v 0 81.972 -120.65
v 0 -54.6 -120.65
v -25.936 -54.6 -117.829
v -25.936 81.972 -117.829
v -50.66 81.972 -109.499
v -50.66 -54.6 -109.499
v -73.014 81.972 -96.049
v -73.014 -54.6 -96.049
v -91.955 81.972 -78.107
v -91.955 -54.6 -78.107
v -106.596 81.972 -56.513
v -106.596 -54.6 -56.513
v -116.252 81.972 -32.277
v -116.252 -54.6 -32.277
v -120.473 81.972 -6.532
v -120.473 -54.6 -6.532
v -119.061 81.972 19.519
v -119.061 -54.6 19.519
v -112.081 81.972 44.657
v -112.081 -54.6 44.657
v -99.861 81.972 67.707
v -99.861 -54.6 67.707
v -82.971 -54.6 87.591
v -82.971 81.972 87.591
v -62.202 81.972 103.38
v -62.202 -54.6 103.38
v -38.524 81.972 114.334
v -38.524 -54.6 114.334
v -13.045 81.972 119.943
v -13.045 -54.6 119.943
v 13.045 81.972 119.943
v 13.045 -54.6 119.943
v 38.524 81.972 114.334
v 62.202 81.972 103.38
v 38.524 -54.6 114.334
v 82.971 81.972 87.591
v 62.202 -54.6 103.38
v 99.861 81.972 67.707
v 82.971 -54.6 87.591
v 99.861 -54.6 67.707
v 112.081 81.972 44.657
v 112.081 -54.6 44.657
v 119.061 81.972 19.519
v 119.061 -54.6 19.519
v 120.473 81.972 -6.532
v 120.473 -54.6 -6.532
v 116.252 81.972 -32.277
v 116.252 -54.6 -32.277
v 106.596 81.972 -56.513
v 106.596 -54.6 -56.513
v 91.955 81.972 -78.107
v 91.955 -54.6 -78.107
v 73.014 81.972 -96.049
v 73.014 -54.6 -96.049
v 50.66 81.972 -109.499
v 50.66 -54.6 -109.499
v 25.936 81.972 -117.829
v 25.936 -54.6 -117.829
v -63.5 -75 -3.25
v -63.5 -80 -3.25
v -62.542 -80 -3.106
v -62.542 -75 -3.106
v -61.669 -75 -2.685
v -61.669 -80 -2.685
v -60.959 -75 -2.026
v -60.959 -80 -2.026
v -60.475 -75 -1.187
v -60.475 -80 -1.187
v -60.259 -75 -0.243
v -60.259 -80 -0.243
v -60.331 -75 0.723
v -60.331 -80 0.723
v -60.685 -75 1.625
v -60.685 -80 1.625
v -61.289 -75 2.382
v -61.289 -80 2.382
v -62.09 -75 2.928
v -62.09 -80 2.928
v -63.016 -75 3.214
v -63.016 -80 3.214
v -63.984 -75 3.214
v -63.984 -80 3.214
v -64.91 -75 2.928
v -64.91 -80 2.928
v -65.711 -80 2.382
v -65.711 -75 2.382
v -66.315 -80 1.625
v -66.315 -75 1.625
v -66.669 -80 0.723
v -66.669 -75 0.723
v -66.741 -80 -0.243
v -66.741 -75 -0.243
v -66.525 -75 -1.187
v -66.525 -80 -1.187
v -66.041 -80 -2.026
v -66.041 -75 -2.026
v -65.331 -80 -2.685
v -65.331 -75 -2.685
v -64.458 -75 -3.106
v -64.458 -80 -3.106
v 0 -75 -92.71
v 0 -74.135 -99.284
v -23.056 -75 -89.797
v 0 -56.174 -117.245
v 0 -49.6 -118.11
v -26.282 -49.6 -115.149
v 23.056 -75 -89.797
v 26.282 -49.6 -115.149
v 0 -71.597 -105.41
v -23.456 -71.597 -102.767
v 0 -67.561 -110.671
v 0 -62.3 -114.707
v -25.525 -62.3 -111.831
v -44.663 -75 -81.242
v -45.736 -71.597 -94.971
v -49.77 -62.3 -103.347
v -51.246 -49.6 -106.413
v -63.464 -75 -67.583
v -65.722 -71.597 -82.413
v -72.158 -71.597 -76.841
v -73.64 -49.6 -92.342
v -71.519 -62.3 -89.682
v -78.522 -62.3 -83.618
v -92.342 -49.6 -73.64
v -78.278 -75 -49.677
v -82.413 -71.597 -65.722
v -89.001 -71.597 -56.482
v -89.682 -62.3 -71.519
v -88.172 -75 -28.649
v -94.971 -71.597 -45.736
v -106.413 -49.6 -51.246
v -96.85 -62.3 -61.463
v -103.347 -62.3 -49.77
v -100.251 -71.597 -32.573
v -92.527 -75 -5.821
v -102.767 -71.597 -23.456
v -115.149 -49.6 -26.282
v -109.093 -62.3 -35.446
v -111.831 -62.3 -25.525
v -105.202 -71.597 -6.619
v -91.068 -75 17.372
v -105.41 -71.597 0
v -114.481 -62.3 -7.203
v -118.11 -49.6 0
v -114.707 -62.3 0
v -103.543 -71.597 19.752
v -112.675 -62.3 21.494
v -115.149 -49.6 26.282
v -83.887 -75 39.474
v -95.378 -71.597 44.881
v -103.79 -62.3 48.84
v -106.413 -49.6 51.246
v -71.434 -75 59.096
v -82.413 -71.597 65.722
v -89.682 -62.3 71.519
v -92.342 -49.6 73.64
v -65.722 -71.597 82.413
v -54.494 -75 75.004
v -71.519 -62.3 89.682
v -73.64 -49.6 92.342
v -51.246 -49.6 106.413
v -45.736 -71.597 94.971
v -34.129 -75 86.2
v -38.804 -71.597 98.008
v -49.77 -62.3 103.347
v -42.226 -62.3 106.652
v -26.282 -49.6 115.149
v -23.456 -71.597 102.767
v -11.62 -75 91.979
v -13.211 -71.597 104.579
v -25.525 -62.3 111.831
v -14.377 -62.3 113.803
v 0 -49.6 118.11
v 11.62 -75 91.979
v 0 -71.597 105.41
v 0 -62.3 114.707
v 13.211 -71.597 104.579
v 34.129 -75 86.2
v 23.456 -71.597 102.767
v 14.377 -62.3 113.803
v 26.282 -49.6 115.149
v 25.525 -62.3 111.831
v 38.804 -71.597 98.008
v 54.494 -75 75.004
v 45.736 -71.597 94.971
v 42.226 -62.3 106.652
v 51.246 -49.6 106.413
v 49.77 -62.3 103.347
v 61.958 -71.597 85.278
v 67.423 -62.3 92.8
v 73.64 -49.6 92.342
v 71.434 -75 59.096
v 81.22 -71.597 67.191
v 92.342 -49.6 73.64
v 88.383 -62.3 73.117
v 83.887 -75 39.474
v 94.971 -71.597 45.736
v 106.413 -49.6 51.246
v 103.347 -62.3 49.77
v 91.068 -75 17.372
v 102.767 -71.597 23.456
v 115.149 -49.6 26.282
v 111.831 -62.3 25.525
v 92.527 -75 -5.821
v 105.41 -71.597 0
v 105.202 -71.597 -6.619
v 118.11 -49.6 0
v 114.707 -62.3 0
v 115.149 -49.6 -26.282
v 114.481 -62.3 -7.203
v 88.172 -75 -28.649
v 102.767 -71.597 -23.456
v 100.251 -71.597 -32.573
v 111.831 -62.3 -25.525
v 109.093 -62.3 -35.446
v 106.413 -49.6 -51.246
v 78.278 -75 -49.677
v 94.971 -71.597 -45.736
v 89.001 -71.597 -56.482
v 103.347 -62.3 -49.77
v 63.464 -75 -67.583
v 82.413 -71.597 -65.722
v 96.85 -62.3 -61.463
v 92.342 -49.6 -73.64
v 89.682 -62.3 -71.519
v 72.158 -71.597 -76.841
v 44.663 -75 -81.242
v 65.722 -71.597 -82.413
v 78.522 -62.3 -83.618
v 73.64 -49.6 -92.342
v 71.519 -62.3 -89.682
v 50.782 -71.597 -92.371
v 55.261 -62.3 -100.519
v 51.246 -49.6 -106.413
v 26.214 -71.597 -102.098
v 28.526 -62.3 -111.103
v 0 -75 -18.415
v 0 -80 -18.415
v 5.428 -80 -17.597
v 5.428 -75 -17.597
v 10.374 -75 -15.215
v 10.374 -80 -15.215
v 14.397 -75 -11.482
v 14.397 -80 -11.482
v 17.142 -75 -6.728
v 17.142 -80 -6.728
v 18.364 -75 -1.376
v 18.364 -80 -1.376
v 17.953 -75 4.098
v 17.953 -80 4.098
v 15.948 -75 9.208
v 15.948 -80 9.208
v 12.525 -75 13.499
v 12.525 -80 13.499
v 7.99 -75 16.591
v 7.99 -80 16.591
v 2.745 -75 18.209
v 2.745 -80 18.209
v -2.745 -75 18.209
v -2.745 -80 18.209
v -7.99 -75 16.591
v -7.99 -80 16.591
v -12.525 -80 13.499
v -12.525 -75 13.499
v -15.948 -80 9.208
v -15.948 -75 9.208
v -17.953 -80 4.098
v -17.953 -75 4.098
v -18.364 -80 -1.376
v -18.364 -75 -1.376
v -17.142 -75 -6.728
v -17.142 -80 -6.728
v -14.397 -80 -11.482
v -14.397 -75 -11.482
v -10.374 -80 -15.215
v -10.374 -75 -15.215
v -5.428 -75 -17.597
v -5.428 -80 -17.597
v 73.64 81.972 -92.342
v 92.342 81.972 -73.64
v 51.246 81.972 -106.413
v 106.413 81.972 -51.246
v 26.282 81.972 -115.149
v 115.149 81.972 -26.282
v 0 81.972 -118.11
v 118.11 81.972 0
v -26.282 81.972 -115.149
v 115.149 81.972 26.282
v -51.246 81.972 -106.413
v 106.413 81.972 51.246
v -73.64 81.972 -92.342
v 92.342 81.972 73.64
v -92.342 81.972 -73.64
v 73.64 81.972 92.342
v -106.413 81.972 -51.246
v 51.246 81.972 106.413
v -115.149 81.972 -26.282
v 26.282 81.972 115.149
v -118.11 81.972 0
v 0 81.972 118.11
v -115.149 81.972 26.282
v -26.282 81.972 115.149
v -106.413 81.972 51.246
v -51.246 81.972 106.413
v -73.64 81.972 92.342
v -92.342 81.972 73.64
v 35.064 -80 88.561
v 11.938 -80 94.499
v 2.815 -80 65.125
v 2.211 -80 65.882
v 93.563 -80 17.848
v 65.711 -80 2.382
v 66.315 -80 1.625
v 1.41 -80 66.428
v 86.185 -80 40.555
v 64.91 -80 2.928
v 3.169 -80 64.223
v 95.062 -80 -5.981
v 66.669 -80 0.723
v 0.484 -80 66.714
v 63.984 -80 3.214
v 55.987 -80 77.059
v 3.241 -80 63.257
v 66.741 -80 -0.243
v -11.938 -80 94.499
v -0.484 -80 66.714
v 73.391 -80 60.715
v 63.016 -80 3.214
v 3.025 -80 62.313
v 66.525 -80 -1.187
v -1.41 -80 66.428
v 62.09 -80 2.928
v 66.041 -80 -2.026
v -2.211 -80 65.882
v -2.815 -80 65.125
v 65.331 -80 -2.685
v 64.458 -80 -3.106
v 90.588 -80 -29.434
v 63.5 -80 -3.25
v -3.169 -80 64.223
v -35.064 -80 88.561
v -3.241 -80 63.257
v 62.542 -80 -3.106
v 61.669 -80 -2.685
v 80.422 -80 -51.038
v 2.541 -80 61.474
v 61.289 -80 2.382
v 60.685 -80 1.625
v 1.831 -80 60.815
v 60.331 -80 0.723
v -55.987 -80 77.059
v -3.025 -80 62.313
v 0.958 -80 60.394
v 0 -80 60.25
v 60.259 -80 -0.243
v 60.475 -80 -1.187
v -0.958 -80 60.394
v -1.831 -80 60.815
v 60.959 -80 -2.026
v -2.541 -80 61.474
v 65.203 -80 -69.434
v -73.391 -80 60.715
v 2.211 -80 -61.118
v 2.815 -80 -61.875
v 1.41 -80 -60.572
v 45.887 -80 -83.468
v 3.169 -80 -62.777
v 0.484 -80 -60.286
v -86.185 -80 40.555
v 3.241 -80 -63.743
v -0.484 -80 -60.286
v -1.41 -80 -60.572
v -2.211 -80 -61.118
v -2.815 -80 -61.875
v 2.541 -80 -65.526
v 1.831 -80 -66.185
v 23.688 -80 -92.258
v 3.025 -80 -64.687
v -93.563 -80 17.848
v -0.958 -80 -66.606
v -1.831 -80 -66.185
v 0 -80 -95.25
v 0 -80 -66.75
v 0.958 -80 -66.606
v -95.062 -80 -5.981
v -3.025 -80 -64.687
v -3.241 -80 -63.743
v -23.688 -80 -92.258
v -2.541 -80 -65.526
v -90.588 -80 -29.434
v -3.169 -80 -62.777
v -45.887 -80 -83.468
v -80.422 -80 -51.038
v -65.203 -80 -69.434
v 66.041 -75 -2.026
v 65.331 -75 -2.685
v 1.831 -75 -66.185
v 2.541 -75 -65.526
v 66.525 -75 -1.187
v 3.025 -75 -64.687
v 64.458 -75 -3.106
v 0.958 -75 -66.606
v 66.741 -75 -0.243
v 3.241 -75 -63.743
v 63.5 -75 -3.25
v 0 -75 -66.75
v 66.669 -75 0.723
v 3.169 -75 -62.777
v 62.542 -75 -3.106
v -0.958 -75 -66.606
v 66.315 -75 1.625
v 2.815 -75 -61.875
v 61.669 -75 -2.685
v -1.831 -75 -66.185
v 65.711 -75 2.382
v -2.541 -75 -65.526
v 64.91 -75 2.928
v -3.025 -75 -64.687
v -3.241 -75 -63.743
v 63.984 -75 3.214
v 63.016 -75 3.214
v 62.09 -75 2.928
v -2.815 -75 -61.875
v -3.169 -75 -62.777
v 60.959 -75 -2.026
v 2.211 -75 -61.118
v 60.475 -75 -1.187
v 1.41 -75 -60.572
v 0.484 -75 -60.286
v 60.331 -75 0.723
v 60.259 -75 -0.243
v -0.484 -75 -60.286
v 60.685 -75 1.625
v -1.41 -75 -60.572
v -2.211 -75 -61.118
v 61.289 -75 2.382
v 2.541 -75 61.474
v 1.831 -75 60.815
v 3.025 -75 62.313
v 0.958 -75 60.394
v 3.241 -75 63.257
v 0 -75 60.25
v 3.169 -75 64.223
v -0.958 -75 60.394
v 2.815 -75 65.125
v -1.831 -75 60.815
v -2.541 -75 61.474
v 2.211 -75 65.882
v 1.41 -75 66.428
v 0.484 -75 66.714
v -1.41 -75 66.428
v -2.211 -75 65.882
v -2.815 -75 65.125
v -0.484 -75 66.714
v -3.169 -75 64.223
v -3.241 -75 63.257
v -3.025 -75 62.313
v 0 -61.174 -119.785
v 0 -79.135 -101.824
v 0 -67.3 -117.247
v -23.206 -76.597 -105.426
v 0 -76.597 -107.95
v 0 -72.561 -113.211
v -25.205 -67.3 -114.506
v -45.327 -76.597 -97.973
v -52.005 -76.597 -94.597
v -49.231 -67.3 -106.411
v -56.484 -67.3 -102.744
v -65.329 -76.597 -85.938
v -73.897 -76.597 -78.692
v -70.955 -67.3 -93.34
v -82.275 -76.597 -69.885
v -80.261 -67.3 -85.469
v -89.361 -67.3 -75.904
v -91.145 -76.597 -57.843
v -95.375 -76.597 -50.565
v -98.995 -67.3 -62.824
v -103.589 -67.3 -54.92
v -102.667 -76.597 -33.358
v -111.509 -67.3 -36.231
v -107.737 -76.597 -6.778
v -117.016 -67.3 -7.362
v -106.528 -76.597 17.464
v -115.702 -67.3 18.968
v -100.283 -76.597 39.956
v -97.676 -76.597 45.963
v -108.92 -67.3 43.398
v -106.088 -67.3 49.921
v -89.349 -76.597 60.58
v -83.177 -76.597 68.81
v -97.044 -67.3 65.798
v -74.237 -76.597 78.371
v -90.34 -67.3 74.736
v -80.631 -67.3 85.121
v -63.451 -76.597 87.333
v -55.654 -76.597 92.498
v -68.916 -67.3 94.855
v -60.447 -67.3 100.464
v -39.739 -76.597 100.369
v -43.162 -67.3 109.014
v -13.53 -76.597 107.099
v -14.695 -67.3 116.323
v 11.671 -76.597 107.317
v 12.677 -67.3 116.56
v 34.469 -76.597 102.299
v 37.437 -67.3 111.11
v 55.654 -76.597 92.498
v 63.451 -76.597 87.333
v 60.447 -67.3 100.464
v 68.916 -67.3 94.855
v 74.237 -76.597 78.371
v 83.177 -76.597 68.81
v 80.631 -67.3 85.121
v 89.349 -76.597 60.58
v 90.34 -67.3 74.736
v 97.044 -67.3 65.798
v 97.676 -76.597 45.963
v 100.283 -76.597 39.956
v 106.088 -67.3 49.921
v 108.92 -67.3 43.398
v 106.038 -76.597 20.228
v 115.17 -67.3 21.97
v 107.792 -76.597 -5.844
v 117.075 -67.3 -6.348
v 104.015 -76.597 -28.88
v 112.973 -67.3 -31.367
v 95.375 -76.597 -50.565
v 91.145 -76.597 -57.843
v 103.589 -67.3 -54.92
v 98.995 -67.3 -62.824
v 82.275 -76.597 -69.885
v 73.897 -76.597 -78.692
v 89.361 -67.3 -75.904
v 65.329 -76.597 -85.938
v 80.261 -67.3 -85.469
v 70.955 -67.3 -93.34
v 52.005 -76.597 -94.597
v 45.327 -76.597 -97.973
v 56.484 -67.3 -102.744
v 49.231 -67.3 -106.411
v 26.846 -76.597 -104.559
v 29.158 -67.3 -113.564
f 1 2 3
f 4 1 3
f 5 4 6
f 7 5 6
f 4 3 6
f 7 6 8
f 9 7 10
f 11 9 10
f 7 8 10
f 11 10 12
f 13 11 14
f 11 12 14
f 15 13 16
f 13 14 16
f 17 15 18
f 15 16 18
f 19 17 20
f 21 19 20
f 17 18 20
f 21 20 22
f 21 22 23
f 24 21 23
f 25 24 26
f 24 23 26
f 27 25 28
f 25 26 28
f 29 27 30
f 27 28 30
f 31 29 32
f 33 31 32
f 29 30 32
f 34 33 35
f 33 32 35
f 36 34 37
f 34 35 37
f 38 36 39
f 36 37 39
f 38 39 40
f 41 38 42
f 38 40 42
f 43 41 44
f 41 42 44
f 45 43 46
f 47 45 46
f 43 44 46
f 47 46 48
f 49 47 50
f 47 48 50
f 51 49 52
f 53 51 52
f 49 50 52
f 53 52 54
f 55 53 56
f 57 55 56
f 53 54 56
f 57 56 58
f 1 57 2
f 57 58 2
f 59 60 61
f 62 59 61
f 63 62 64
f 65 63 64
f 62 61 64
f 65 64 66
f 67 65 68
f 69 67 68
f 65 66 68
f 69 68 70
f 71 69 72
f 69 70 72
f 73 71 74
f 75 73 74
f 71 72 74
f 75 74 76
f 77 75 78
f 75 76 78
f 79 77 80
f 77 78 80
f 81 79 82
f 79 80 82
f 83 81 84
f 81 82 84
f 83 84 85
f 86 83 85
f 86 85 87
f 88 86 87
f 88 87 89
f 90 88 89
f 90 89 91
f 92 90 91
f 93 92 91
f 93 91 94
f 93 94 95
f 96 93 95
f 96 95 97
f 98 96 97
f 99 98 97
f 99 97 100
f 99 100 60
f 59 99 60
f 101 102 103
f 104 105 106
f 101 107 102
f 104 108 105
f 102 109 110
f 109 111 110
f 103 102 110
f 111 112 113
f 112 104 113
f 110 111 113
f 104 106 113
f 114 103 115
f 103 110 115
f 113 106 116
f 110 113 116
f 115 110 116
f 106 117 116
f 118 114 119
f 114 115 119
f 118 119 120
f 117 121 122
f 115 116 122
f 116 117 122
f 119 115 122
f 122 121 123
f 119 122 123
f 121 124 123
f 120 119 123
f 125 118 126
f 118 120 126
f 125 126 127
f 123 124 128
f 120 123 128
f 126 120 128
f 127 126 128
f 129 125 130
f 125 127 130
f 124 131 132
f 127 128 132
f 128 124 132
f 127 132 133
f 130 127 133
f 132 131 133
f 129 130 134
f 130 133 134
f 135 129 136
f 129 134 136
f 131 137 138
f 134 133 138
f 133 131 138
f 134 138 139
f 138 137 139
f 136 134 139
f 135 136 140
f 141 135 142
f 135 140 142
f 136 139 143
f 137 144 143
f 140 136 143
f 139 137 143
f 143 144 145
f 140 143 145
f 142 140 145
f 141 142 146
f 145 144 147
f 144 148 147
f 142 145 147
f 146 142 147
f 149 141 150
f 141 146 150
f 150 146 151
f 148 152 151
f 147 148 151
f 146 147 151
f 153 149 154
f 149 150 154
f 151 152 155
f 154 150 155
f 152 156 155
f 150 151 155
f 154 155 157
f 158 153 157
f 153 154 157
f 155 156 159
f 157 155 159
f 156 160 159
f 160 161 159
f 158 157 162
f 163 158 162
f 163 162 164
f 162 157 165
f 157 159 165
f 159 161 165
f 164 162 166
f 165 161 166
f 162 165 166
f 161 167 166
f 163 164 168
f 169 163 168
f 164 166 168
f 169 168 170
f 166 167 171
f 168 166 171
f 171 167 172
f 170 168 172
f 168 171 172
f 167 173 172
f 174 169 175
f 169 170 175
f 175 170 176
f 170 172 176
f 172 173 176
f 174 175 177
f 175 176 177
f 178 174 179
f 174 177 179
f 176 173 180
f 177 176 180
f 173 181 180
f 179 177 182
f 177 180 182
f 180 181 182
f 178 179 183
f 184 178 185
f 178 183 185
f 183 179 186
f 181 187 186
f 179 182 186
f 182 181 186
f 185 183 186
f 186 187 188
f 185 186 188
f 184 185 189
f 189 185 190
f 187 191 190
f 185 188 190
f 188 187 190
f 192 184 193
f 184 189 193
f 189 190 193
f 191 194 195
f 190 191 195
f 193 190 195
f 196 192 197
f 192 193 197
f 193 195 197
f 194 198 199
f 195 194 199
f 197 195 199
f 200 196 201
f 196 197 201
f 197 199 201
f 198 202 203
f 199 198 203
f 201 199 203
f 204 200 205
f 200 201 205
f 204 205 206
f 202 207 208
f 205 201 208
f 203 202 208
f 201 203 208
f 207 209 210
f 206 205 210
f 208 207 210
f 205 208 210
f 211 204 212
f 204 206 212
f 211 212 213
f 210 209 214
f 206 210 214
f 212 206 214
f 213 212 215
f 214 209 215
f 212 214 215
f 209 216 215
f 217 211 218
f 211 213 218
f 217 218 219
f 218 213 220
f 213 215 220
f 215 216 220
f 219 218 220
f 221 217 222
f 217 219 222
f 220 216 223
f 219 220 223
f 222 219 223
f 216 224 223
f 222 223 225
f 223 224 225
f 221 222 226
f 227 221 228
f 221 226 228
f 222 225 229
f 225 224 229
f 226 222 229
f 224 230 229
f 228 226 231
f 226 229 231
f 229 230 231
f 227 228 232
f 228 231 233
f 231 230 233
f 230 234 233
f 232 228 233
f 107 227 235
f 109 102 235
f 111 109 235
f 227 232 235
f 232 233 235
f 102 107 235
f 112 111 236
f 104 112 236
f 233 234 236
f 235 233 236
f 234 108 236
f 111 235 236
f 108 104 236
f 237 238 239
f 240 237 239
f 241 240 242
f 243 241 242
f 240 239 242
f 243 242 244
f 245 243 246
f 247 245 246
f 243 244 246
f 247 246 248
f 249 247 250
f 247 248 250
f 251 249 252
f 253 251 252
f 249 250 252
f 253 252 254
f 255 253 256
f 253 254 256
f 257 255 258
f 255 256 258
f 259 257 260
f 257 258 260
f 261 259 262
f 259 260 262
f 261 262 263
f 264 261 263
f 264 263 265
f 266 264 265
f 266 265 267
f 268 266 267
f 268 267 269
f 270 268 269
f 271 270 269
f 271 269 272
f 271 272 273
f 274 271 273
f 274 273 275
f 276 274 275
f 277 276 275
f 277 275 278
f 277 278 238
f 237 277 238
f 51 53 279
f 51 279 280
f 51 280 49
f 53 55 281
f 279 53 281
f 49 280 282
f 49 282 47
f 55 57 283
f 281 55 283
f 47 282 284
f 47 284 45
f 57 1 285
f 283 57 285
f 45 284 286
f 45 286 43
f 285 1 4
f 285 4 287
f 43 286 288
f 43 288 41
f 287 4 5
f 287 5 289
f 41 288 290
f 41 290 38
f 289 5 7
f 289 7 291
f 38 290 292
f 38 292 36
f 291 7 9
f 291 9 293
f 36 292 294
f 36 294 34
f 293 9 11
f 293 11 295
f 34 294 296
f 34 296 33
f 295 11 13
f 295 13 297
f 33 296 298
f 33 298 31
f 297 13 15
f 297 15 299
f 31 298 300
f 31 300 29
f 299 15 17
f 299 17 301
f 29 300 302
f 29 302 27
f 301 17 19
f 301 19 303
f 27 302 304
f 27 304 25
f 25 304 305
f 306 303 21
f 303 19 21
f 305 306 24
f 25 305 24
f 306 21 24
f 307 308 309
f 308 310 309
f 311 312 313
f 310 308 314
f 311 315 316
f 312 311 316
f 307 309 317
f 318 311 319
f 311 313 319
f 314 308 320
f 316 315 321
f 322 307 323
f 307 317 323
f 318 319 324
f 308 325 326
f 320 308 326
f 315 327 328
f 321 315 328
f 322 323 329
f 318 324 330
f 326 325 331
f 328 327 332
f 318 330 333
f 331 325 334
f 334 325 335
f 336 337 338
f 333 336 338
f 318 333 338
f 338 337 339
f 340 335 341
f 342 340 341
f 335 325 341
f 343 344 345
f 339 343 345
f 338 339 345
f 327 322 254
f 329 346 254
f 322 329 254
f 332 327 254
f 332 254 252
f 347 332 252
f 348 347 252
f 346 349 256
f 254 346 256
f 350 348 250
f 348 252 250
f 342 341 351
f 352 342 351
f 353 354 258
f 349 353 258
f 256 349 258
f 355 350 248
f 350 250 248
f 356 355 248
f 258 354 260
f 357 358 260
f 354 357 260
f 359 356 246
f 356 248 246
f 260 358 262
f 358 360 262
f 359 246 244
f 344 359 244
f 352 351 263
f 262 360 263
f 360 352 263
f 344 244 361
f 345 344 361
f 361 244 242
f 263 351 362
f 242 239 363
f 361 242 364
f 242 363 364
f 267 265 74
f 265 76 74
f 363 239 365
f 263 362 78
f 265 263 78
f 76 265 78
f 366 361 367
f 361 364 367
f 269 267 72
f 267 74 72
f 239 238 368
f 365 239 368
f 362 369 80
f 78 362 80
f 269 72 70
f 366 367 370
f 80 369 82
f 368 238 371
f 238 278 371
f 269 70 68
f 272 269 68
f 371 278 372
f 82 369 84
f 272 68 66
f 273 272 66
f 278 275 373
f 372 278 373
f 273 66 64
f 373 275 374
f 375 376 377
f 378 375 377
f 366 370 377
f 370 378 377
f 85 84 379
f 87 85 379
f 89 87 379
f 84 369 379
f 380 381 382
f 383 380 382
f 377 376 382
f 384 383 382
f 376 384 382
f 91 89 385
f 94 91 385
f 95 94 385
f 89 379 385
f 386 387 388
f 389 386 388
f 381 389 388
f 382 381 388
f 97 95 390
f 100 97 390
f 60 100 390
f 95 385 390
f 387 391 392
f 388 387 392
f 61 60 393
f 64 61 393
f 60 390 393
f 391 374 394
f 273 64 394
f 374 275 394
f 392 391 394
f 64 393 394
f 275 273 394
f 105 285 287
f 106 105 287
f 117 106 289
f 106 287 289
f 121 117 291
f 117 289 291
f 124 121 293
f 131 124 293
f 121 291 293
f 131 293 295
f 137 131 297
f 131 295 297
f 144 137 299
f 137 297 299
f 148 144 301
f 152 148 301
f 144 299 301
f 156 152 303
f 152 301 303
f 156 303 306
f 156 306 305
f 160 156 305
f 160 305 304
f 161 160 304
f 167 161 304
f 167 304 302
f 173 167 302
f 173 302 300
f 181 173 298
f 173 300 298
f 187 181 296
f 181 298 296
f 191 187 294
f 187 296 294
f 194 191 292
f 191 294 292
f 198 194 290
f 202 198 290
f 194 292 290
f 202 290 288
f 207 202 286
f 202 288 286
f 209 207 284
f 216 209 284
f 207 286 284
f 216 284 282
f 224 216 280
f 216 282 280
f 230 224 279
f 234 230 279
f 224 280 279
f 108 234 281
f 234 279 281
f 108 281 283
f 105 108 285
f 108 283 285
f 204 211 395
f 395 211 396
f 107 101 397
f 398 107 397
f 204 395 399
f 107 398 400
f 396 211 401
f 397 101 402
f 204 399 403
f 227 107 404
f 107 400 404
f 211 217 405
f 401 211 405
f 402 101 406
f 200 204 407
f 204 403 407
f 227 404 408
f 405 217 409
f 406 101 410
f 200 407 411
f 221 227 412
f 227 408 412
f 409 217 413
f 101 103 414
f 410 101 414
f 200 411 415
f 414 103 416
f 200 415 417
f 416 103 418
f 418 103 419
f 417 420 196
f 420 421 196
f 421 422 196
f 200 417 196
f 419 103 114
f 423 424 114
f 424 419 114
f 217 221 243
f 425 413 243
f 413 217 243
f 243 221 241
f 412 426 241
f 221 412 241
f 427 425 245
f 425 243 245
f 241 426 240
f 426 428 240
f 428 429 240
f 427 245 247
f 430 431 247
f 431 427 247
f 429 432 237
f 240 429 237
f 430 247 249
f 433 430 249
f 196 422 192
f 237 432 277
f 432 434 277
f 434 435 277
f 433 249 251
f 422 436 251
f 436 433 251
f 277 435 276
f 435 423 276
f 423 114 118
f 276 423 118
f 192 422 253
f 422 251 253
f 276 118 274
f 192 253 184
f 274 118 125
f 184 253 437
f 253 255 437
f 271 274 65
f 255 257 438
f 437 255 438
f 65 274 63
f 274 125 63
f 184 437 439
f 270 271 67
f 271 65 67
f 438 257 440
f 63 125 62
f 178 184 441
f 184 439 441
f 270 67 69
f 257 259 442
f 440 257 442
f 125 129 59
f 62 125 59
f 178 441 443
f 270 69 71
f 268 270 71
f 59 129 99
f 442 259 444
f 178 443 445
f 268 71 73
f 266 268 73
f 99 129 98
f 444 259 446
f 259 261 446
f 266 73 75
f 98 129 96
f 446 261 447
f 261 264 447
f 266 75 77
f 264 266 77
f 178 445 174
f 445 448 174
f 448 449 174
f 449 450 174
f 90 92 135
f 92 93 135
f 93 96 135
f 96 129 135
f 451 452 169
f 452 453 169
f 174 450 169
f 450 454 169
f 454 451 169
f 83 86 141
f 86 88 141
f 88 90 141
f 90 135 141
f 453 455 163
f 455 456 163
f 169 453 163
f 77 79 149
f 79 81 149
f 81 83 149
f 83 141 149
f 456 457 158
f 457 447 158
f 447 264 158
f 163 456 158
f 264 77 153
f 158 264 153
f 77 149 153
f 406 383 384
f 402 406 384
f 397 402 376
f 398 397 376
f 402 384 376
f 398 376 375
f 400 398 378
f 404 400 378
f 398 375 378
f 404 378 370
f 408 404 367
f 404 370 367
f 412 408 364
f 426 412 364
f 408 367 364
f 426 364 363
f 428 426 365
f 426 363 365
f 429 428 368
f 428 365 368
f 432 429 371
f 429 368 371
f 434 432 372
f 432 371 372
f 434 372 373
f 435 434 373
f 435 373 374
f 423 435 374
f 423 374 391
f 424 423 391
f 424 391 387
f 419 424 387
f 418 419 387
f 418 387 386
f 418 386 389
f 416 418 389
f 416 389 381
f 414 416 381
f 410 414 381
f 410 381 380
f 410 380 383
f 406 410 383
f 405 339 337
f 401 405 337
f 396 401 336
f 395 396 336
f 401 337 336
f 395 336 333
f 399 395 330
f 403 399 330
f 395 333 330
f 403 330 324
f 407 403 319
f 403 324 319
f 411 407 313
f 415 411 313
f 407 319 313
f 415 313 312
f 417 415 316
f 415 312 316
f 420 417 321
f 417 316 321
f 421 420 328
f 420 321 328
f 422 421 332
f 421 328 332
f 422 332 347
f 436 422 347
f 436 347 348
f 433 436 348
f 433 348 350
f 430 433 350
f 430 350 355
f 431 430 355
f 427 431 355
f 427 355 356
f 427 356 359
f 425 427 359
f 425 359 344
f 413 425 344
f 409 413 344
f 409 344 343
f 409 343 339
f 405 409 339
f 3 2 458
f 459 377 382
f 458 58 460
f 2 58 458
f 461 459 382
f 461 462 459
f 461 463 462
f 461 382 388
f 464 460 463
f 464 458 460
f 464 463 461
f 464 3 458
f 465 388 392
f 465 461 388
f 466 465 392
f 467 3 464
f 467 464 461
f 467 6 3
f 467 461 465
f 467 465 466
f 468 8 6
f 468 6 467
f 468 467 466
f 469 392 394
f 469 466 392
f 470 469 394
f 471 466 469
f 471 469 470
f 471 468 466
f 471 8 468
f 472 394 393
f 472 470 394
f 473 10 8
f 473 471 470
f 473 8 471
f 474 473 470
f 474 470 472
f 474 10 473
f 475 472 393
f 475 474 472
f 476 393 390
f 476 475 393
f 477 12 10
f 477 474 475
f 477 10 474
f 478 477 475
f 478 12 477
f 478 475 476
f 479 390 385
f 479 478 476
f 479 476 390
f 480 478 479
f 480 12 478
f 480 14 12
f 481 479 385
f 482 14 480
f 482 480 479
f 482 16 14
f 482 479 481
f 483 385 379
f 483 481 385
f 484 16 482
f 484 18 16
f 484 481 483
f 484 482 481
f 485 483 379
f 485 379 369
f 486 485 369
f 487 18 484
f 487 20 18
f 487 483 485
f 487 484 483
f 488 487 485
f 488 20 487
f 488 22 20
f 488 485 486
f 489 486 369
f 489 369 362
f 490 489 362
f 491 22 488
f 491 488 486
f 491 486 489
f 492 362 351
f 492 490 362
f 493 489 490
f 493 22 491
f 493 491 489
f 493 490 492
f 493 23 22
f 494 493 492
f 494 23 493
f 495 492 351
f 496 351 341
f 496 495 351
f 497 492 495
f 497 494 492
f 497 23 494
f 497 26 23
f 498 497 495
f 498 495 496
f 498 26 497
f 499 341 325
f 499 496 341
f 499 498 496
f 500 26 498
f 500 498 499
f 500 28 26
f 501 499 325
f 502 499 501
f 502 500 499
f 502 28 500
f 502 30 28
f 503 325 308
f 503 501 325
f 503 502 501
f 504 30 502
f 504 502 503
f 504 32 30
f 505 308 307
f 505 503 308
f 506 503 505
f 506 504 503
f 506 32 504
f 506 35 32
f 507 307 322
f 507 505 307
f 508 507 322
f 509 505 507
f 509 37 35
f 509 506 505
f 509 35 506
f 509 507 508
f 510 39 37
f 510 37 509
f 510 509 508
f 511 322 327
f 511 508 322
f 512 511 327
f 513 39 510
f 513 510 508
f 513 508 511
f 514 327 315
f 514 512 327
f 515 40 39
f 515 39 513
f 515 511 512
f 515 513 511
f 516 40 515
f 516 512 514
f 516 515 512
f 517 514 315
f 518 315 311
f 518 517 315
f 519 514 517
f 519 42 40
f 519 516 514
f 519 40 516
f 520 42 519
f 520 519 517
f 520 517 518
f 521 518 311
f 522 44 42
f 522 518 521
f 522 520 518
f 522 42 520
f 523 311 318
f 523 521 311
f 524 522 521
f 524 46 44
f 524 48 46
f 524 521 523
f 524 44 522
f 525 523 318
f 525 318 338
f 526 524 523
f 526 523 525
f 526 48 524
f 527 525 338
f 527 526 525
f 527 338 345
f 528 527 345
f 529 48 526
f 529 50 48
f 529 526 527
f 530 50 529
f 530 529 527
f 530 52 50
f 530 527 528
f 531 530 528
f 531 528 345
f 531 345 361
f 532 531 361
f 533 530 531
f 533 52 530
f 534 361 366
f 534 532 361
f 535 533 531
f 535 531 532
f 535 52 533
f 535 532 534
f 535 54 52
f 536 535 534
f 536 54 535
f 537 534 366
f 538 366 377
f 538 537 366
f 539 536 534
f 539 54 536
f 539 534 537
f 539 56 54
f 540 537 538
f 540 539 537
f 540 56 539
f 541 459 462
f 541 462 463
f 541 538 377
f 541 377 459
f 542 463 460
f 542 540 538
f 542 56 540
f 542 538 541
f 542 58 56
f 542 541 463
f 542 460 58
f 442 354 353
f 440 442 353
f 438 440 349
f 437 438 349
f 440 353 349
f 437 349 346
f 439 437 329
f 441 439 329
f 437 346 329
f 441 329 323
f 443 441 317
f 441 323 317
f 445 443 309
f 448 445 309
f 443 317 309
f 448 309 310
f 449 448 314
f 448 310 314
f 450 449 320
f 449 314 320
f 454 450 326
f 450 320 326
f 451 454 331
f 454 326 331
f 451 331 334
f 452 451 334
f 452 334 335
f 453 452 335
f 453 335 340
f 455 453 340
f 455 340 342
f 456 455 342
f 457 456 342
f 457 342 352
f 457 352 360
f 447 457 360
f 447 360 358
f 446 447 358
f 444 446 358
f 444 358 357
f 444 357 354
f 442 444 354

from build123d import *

# Parameters (mm, degrees)
CUT_EXTRUDE2_REACH = 237.261
MOTOR_HOLE_R       = 18.415
SKETCH1_R          = 3.25
CUT_EXTRUDE3_DEPTH = 236.261075795
FILLET2_R          = 25.4


with BuildPart() as part:
    # Compartment → Revolve1 (revolve)
    with BuildSketch(Plane.XY, mode=Mode.PRIVATE) as revolve1_sk:
        Polygon((120.65, -80), (0, -80), (0, -75), (118.11, -75), (118.11, 81.972), (120.65, 81.972), align=None)
    revolve(revolve1_sk.sketch.rotate(Axis((0, 0, 0), (0, 1, 0)), 90), axis=Axis((0, 0, 0), (0, 1, 0)))

    # Motor Hole → Cut-Extrude2 (cut, up to next)
    with BuildSketch(Plane.XZ.offset(80), mode=Mode.PRIVATE) as cut_extrude2_sk1:
        with Locations(Location((0, 0, 0), (0, 0, 270))):
            Circle(MOTOR_HOLE_R)
    cut_extrude2_tool1 = extrude(cut_extrude2_sk1.sketch, amount=-CUT_EXTRUDE2_REACH, mode=Mode.PRIVATE) & part.part
    add(cut_extrude2_tool1.solids().sort_by_distance((0, -80, 0))[0], mode=Mode.SUBTRACT)

    # Sketch1 → Cut-Extrude3 (cut, through all)
    with BuildSketch(Plane.XZ.offset(80)):
        with Locations(Location((0, 63.5, 0), (0, 0, 270))):
            Circle(SKETCH1_R)
        with Locations(Location((0, -63.5, 0), (0, 0, 270))):
            Circle(SKETCH1_R)
        with Locations(Location((63.5, 0, 0), (0, 0, 270))):
            Circle(SKETCH1_R)
        with Locations(Location((-63.5, 0, 0), (0, 0, 270))):
            Circle(SKETCH1_R)
    extrude(amount=-CUT_EXTRUDE3_DEPTH, mode=Mode.SUBTRACT)

    # Fillet2
    fillet2_edges = [part.edges().sort_by_distance(p)[0] for p in [
        (0, -75, 118.11),
        (0, -80, 120.65),
    ]]
    fillet(fillet2_edges, radius=FILLET2_R)


solid = part.part
